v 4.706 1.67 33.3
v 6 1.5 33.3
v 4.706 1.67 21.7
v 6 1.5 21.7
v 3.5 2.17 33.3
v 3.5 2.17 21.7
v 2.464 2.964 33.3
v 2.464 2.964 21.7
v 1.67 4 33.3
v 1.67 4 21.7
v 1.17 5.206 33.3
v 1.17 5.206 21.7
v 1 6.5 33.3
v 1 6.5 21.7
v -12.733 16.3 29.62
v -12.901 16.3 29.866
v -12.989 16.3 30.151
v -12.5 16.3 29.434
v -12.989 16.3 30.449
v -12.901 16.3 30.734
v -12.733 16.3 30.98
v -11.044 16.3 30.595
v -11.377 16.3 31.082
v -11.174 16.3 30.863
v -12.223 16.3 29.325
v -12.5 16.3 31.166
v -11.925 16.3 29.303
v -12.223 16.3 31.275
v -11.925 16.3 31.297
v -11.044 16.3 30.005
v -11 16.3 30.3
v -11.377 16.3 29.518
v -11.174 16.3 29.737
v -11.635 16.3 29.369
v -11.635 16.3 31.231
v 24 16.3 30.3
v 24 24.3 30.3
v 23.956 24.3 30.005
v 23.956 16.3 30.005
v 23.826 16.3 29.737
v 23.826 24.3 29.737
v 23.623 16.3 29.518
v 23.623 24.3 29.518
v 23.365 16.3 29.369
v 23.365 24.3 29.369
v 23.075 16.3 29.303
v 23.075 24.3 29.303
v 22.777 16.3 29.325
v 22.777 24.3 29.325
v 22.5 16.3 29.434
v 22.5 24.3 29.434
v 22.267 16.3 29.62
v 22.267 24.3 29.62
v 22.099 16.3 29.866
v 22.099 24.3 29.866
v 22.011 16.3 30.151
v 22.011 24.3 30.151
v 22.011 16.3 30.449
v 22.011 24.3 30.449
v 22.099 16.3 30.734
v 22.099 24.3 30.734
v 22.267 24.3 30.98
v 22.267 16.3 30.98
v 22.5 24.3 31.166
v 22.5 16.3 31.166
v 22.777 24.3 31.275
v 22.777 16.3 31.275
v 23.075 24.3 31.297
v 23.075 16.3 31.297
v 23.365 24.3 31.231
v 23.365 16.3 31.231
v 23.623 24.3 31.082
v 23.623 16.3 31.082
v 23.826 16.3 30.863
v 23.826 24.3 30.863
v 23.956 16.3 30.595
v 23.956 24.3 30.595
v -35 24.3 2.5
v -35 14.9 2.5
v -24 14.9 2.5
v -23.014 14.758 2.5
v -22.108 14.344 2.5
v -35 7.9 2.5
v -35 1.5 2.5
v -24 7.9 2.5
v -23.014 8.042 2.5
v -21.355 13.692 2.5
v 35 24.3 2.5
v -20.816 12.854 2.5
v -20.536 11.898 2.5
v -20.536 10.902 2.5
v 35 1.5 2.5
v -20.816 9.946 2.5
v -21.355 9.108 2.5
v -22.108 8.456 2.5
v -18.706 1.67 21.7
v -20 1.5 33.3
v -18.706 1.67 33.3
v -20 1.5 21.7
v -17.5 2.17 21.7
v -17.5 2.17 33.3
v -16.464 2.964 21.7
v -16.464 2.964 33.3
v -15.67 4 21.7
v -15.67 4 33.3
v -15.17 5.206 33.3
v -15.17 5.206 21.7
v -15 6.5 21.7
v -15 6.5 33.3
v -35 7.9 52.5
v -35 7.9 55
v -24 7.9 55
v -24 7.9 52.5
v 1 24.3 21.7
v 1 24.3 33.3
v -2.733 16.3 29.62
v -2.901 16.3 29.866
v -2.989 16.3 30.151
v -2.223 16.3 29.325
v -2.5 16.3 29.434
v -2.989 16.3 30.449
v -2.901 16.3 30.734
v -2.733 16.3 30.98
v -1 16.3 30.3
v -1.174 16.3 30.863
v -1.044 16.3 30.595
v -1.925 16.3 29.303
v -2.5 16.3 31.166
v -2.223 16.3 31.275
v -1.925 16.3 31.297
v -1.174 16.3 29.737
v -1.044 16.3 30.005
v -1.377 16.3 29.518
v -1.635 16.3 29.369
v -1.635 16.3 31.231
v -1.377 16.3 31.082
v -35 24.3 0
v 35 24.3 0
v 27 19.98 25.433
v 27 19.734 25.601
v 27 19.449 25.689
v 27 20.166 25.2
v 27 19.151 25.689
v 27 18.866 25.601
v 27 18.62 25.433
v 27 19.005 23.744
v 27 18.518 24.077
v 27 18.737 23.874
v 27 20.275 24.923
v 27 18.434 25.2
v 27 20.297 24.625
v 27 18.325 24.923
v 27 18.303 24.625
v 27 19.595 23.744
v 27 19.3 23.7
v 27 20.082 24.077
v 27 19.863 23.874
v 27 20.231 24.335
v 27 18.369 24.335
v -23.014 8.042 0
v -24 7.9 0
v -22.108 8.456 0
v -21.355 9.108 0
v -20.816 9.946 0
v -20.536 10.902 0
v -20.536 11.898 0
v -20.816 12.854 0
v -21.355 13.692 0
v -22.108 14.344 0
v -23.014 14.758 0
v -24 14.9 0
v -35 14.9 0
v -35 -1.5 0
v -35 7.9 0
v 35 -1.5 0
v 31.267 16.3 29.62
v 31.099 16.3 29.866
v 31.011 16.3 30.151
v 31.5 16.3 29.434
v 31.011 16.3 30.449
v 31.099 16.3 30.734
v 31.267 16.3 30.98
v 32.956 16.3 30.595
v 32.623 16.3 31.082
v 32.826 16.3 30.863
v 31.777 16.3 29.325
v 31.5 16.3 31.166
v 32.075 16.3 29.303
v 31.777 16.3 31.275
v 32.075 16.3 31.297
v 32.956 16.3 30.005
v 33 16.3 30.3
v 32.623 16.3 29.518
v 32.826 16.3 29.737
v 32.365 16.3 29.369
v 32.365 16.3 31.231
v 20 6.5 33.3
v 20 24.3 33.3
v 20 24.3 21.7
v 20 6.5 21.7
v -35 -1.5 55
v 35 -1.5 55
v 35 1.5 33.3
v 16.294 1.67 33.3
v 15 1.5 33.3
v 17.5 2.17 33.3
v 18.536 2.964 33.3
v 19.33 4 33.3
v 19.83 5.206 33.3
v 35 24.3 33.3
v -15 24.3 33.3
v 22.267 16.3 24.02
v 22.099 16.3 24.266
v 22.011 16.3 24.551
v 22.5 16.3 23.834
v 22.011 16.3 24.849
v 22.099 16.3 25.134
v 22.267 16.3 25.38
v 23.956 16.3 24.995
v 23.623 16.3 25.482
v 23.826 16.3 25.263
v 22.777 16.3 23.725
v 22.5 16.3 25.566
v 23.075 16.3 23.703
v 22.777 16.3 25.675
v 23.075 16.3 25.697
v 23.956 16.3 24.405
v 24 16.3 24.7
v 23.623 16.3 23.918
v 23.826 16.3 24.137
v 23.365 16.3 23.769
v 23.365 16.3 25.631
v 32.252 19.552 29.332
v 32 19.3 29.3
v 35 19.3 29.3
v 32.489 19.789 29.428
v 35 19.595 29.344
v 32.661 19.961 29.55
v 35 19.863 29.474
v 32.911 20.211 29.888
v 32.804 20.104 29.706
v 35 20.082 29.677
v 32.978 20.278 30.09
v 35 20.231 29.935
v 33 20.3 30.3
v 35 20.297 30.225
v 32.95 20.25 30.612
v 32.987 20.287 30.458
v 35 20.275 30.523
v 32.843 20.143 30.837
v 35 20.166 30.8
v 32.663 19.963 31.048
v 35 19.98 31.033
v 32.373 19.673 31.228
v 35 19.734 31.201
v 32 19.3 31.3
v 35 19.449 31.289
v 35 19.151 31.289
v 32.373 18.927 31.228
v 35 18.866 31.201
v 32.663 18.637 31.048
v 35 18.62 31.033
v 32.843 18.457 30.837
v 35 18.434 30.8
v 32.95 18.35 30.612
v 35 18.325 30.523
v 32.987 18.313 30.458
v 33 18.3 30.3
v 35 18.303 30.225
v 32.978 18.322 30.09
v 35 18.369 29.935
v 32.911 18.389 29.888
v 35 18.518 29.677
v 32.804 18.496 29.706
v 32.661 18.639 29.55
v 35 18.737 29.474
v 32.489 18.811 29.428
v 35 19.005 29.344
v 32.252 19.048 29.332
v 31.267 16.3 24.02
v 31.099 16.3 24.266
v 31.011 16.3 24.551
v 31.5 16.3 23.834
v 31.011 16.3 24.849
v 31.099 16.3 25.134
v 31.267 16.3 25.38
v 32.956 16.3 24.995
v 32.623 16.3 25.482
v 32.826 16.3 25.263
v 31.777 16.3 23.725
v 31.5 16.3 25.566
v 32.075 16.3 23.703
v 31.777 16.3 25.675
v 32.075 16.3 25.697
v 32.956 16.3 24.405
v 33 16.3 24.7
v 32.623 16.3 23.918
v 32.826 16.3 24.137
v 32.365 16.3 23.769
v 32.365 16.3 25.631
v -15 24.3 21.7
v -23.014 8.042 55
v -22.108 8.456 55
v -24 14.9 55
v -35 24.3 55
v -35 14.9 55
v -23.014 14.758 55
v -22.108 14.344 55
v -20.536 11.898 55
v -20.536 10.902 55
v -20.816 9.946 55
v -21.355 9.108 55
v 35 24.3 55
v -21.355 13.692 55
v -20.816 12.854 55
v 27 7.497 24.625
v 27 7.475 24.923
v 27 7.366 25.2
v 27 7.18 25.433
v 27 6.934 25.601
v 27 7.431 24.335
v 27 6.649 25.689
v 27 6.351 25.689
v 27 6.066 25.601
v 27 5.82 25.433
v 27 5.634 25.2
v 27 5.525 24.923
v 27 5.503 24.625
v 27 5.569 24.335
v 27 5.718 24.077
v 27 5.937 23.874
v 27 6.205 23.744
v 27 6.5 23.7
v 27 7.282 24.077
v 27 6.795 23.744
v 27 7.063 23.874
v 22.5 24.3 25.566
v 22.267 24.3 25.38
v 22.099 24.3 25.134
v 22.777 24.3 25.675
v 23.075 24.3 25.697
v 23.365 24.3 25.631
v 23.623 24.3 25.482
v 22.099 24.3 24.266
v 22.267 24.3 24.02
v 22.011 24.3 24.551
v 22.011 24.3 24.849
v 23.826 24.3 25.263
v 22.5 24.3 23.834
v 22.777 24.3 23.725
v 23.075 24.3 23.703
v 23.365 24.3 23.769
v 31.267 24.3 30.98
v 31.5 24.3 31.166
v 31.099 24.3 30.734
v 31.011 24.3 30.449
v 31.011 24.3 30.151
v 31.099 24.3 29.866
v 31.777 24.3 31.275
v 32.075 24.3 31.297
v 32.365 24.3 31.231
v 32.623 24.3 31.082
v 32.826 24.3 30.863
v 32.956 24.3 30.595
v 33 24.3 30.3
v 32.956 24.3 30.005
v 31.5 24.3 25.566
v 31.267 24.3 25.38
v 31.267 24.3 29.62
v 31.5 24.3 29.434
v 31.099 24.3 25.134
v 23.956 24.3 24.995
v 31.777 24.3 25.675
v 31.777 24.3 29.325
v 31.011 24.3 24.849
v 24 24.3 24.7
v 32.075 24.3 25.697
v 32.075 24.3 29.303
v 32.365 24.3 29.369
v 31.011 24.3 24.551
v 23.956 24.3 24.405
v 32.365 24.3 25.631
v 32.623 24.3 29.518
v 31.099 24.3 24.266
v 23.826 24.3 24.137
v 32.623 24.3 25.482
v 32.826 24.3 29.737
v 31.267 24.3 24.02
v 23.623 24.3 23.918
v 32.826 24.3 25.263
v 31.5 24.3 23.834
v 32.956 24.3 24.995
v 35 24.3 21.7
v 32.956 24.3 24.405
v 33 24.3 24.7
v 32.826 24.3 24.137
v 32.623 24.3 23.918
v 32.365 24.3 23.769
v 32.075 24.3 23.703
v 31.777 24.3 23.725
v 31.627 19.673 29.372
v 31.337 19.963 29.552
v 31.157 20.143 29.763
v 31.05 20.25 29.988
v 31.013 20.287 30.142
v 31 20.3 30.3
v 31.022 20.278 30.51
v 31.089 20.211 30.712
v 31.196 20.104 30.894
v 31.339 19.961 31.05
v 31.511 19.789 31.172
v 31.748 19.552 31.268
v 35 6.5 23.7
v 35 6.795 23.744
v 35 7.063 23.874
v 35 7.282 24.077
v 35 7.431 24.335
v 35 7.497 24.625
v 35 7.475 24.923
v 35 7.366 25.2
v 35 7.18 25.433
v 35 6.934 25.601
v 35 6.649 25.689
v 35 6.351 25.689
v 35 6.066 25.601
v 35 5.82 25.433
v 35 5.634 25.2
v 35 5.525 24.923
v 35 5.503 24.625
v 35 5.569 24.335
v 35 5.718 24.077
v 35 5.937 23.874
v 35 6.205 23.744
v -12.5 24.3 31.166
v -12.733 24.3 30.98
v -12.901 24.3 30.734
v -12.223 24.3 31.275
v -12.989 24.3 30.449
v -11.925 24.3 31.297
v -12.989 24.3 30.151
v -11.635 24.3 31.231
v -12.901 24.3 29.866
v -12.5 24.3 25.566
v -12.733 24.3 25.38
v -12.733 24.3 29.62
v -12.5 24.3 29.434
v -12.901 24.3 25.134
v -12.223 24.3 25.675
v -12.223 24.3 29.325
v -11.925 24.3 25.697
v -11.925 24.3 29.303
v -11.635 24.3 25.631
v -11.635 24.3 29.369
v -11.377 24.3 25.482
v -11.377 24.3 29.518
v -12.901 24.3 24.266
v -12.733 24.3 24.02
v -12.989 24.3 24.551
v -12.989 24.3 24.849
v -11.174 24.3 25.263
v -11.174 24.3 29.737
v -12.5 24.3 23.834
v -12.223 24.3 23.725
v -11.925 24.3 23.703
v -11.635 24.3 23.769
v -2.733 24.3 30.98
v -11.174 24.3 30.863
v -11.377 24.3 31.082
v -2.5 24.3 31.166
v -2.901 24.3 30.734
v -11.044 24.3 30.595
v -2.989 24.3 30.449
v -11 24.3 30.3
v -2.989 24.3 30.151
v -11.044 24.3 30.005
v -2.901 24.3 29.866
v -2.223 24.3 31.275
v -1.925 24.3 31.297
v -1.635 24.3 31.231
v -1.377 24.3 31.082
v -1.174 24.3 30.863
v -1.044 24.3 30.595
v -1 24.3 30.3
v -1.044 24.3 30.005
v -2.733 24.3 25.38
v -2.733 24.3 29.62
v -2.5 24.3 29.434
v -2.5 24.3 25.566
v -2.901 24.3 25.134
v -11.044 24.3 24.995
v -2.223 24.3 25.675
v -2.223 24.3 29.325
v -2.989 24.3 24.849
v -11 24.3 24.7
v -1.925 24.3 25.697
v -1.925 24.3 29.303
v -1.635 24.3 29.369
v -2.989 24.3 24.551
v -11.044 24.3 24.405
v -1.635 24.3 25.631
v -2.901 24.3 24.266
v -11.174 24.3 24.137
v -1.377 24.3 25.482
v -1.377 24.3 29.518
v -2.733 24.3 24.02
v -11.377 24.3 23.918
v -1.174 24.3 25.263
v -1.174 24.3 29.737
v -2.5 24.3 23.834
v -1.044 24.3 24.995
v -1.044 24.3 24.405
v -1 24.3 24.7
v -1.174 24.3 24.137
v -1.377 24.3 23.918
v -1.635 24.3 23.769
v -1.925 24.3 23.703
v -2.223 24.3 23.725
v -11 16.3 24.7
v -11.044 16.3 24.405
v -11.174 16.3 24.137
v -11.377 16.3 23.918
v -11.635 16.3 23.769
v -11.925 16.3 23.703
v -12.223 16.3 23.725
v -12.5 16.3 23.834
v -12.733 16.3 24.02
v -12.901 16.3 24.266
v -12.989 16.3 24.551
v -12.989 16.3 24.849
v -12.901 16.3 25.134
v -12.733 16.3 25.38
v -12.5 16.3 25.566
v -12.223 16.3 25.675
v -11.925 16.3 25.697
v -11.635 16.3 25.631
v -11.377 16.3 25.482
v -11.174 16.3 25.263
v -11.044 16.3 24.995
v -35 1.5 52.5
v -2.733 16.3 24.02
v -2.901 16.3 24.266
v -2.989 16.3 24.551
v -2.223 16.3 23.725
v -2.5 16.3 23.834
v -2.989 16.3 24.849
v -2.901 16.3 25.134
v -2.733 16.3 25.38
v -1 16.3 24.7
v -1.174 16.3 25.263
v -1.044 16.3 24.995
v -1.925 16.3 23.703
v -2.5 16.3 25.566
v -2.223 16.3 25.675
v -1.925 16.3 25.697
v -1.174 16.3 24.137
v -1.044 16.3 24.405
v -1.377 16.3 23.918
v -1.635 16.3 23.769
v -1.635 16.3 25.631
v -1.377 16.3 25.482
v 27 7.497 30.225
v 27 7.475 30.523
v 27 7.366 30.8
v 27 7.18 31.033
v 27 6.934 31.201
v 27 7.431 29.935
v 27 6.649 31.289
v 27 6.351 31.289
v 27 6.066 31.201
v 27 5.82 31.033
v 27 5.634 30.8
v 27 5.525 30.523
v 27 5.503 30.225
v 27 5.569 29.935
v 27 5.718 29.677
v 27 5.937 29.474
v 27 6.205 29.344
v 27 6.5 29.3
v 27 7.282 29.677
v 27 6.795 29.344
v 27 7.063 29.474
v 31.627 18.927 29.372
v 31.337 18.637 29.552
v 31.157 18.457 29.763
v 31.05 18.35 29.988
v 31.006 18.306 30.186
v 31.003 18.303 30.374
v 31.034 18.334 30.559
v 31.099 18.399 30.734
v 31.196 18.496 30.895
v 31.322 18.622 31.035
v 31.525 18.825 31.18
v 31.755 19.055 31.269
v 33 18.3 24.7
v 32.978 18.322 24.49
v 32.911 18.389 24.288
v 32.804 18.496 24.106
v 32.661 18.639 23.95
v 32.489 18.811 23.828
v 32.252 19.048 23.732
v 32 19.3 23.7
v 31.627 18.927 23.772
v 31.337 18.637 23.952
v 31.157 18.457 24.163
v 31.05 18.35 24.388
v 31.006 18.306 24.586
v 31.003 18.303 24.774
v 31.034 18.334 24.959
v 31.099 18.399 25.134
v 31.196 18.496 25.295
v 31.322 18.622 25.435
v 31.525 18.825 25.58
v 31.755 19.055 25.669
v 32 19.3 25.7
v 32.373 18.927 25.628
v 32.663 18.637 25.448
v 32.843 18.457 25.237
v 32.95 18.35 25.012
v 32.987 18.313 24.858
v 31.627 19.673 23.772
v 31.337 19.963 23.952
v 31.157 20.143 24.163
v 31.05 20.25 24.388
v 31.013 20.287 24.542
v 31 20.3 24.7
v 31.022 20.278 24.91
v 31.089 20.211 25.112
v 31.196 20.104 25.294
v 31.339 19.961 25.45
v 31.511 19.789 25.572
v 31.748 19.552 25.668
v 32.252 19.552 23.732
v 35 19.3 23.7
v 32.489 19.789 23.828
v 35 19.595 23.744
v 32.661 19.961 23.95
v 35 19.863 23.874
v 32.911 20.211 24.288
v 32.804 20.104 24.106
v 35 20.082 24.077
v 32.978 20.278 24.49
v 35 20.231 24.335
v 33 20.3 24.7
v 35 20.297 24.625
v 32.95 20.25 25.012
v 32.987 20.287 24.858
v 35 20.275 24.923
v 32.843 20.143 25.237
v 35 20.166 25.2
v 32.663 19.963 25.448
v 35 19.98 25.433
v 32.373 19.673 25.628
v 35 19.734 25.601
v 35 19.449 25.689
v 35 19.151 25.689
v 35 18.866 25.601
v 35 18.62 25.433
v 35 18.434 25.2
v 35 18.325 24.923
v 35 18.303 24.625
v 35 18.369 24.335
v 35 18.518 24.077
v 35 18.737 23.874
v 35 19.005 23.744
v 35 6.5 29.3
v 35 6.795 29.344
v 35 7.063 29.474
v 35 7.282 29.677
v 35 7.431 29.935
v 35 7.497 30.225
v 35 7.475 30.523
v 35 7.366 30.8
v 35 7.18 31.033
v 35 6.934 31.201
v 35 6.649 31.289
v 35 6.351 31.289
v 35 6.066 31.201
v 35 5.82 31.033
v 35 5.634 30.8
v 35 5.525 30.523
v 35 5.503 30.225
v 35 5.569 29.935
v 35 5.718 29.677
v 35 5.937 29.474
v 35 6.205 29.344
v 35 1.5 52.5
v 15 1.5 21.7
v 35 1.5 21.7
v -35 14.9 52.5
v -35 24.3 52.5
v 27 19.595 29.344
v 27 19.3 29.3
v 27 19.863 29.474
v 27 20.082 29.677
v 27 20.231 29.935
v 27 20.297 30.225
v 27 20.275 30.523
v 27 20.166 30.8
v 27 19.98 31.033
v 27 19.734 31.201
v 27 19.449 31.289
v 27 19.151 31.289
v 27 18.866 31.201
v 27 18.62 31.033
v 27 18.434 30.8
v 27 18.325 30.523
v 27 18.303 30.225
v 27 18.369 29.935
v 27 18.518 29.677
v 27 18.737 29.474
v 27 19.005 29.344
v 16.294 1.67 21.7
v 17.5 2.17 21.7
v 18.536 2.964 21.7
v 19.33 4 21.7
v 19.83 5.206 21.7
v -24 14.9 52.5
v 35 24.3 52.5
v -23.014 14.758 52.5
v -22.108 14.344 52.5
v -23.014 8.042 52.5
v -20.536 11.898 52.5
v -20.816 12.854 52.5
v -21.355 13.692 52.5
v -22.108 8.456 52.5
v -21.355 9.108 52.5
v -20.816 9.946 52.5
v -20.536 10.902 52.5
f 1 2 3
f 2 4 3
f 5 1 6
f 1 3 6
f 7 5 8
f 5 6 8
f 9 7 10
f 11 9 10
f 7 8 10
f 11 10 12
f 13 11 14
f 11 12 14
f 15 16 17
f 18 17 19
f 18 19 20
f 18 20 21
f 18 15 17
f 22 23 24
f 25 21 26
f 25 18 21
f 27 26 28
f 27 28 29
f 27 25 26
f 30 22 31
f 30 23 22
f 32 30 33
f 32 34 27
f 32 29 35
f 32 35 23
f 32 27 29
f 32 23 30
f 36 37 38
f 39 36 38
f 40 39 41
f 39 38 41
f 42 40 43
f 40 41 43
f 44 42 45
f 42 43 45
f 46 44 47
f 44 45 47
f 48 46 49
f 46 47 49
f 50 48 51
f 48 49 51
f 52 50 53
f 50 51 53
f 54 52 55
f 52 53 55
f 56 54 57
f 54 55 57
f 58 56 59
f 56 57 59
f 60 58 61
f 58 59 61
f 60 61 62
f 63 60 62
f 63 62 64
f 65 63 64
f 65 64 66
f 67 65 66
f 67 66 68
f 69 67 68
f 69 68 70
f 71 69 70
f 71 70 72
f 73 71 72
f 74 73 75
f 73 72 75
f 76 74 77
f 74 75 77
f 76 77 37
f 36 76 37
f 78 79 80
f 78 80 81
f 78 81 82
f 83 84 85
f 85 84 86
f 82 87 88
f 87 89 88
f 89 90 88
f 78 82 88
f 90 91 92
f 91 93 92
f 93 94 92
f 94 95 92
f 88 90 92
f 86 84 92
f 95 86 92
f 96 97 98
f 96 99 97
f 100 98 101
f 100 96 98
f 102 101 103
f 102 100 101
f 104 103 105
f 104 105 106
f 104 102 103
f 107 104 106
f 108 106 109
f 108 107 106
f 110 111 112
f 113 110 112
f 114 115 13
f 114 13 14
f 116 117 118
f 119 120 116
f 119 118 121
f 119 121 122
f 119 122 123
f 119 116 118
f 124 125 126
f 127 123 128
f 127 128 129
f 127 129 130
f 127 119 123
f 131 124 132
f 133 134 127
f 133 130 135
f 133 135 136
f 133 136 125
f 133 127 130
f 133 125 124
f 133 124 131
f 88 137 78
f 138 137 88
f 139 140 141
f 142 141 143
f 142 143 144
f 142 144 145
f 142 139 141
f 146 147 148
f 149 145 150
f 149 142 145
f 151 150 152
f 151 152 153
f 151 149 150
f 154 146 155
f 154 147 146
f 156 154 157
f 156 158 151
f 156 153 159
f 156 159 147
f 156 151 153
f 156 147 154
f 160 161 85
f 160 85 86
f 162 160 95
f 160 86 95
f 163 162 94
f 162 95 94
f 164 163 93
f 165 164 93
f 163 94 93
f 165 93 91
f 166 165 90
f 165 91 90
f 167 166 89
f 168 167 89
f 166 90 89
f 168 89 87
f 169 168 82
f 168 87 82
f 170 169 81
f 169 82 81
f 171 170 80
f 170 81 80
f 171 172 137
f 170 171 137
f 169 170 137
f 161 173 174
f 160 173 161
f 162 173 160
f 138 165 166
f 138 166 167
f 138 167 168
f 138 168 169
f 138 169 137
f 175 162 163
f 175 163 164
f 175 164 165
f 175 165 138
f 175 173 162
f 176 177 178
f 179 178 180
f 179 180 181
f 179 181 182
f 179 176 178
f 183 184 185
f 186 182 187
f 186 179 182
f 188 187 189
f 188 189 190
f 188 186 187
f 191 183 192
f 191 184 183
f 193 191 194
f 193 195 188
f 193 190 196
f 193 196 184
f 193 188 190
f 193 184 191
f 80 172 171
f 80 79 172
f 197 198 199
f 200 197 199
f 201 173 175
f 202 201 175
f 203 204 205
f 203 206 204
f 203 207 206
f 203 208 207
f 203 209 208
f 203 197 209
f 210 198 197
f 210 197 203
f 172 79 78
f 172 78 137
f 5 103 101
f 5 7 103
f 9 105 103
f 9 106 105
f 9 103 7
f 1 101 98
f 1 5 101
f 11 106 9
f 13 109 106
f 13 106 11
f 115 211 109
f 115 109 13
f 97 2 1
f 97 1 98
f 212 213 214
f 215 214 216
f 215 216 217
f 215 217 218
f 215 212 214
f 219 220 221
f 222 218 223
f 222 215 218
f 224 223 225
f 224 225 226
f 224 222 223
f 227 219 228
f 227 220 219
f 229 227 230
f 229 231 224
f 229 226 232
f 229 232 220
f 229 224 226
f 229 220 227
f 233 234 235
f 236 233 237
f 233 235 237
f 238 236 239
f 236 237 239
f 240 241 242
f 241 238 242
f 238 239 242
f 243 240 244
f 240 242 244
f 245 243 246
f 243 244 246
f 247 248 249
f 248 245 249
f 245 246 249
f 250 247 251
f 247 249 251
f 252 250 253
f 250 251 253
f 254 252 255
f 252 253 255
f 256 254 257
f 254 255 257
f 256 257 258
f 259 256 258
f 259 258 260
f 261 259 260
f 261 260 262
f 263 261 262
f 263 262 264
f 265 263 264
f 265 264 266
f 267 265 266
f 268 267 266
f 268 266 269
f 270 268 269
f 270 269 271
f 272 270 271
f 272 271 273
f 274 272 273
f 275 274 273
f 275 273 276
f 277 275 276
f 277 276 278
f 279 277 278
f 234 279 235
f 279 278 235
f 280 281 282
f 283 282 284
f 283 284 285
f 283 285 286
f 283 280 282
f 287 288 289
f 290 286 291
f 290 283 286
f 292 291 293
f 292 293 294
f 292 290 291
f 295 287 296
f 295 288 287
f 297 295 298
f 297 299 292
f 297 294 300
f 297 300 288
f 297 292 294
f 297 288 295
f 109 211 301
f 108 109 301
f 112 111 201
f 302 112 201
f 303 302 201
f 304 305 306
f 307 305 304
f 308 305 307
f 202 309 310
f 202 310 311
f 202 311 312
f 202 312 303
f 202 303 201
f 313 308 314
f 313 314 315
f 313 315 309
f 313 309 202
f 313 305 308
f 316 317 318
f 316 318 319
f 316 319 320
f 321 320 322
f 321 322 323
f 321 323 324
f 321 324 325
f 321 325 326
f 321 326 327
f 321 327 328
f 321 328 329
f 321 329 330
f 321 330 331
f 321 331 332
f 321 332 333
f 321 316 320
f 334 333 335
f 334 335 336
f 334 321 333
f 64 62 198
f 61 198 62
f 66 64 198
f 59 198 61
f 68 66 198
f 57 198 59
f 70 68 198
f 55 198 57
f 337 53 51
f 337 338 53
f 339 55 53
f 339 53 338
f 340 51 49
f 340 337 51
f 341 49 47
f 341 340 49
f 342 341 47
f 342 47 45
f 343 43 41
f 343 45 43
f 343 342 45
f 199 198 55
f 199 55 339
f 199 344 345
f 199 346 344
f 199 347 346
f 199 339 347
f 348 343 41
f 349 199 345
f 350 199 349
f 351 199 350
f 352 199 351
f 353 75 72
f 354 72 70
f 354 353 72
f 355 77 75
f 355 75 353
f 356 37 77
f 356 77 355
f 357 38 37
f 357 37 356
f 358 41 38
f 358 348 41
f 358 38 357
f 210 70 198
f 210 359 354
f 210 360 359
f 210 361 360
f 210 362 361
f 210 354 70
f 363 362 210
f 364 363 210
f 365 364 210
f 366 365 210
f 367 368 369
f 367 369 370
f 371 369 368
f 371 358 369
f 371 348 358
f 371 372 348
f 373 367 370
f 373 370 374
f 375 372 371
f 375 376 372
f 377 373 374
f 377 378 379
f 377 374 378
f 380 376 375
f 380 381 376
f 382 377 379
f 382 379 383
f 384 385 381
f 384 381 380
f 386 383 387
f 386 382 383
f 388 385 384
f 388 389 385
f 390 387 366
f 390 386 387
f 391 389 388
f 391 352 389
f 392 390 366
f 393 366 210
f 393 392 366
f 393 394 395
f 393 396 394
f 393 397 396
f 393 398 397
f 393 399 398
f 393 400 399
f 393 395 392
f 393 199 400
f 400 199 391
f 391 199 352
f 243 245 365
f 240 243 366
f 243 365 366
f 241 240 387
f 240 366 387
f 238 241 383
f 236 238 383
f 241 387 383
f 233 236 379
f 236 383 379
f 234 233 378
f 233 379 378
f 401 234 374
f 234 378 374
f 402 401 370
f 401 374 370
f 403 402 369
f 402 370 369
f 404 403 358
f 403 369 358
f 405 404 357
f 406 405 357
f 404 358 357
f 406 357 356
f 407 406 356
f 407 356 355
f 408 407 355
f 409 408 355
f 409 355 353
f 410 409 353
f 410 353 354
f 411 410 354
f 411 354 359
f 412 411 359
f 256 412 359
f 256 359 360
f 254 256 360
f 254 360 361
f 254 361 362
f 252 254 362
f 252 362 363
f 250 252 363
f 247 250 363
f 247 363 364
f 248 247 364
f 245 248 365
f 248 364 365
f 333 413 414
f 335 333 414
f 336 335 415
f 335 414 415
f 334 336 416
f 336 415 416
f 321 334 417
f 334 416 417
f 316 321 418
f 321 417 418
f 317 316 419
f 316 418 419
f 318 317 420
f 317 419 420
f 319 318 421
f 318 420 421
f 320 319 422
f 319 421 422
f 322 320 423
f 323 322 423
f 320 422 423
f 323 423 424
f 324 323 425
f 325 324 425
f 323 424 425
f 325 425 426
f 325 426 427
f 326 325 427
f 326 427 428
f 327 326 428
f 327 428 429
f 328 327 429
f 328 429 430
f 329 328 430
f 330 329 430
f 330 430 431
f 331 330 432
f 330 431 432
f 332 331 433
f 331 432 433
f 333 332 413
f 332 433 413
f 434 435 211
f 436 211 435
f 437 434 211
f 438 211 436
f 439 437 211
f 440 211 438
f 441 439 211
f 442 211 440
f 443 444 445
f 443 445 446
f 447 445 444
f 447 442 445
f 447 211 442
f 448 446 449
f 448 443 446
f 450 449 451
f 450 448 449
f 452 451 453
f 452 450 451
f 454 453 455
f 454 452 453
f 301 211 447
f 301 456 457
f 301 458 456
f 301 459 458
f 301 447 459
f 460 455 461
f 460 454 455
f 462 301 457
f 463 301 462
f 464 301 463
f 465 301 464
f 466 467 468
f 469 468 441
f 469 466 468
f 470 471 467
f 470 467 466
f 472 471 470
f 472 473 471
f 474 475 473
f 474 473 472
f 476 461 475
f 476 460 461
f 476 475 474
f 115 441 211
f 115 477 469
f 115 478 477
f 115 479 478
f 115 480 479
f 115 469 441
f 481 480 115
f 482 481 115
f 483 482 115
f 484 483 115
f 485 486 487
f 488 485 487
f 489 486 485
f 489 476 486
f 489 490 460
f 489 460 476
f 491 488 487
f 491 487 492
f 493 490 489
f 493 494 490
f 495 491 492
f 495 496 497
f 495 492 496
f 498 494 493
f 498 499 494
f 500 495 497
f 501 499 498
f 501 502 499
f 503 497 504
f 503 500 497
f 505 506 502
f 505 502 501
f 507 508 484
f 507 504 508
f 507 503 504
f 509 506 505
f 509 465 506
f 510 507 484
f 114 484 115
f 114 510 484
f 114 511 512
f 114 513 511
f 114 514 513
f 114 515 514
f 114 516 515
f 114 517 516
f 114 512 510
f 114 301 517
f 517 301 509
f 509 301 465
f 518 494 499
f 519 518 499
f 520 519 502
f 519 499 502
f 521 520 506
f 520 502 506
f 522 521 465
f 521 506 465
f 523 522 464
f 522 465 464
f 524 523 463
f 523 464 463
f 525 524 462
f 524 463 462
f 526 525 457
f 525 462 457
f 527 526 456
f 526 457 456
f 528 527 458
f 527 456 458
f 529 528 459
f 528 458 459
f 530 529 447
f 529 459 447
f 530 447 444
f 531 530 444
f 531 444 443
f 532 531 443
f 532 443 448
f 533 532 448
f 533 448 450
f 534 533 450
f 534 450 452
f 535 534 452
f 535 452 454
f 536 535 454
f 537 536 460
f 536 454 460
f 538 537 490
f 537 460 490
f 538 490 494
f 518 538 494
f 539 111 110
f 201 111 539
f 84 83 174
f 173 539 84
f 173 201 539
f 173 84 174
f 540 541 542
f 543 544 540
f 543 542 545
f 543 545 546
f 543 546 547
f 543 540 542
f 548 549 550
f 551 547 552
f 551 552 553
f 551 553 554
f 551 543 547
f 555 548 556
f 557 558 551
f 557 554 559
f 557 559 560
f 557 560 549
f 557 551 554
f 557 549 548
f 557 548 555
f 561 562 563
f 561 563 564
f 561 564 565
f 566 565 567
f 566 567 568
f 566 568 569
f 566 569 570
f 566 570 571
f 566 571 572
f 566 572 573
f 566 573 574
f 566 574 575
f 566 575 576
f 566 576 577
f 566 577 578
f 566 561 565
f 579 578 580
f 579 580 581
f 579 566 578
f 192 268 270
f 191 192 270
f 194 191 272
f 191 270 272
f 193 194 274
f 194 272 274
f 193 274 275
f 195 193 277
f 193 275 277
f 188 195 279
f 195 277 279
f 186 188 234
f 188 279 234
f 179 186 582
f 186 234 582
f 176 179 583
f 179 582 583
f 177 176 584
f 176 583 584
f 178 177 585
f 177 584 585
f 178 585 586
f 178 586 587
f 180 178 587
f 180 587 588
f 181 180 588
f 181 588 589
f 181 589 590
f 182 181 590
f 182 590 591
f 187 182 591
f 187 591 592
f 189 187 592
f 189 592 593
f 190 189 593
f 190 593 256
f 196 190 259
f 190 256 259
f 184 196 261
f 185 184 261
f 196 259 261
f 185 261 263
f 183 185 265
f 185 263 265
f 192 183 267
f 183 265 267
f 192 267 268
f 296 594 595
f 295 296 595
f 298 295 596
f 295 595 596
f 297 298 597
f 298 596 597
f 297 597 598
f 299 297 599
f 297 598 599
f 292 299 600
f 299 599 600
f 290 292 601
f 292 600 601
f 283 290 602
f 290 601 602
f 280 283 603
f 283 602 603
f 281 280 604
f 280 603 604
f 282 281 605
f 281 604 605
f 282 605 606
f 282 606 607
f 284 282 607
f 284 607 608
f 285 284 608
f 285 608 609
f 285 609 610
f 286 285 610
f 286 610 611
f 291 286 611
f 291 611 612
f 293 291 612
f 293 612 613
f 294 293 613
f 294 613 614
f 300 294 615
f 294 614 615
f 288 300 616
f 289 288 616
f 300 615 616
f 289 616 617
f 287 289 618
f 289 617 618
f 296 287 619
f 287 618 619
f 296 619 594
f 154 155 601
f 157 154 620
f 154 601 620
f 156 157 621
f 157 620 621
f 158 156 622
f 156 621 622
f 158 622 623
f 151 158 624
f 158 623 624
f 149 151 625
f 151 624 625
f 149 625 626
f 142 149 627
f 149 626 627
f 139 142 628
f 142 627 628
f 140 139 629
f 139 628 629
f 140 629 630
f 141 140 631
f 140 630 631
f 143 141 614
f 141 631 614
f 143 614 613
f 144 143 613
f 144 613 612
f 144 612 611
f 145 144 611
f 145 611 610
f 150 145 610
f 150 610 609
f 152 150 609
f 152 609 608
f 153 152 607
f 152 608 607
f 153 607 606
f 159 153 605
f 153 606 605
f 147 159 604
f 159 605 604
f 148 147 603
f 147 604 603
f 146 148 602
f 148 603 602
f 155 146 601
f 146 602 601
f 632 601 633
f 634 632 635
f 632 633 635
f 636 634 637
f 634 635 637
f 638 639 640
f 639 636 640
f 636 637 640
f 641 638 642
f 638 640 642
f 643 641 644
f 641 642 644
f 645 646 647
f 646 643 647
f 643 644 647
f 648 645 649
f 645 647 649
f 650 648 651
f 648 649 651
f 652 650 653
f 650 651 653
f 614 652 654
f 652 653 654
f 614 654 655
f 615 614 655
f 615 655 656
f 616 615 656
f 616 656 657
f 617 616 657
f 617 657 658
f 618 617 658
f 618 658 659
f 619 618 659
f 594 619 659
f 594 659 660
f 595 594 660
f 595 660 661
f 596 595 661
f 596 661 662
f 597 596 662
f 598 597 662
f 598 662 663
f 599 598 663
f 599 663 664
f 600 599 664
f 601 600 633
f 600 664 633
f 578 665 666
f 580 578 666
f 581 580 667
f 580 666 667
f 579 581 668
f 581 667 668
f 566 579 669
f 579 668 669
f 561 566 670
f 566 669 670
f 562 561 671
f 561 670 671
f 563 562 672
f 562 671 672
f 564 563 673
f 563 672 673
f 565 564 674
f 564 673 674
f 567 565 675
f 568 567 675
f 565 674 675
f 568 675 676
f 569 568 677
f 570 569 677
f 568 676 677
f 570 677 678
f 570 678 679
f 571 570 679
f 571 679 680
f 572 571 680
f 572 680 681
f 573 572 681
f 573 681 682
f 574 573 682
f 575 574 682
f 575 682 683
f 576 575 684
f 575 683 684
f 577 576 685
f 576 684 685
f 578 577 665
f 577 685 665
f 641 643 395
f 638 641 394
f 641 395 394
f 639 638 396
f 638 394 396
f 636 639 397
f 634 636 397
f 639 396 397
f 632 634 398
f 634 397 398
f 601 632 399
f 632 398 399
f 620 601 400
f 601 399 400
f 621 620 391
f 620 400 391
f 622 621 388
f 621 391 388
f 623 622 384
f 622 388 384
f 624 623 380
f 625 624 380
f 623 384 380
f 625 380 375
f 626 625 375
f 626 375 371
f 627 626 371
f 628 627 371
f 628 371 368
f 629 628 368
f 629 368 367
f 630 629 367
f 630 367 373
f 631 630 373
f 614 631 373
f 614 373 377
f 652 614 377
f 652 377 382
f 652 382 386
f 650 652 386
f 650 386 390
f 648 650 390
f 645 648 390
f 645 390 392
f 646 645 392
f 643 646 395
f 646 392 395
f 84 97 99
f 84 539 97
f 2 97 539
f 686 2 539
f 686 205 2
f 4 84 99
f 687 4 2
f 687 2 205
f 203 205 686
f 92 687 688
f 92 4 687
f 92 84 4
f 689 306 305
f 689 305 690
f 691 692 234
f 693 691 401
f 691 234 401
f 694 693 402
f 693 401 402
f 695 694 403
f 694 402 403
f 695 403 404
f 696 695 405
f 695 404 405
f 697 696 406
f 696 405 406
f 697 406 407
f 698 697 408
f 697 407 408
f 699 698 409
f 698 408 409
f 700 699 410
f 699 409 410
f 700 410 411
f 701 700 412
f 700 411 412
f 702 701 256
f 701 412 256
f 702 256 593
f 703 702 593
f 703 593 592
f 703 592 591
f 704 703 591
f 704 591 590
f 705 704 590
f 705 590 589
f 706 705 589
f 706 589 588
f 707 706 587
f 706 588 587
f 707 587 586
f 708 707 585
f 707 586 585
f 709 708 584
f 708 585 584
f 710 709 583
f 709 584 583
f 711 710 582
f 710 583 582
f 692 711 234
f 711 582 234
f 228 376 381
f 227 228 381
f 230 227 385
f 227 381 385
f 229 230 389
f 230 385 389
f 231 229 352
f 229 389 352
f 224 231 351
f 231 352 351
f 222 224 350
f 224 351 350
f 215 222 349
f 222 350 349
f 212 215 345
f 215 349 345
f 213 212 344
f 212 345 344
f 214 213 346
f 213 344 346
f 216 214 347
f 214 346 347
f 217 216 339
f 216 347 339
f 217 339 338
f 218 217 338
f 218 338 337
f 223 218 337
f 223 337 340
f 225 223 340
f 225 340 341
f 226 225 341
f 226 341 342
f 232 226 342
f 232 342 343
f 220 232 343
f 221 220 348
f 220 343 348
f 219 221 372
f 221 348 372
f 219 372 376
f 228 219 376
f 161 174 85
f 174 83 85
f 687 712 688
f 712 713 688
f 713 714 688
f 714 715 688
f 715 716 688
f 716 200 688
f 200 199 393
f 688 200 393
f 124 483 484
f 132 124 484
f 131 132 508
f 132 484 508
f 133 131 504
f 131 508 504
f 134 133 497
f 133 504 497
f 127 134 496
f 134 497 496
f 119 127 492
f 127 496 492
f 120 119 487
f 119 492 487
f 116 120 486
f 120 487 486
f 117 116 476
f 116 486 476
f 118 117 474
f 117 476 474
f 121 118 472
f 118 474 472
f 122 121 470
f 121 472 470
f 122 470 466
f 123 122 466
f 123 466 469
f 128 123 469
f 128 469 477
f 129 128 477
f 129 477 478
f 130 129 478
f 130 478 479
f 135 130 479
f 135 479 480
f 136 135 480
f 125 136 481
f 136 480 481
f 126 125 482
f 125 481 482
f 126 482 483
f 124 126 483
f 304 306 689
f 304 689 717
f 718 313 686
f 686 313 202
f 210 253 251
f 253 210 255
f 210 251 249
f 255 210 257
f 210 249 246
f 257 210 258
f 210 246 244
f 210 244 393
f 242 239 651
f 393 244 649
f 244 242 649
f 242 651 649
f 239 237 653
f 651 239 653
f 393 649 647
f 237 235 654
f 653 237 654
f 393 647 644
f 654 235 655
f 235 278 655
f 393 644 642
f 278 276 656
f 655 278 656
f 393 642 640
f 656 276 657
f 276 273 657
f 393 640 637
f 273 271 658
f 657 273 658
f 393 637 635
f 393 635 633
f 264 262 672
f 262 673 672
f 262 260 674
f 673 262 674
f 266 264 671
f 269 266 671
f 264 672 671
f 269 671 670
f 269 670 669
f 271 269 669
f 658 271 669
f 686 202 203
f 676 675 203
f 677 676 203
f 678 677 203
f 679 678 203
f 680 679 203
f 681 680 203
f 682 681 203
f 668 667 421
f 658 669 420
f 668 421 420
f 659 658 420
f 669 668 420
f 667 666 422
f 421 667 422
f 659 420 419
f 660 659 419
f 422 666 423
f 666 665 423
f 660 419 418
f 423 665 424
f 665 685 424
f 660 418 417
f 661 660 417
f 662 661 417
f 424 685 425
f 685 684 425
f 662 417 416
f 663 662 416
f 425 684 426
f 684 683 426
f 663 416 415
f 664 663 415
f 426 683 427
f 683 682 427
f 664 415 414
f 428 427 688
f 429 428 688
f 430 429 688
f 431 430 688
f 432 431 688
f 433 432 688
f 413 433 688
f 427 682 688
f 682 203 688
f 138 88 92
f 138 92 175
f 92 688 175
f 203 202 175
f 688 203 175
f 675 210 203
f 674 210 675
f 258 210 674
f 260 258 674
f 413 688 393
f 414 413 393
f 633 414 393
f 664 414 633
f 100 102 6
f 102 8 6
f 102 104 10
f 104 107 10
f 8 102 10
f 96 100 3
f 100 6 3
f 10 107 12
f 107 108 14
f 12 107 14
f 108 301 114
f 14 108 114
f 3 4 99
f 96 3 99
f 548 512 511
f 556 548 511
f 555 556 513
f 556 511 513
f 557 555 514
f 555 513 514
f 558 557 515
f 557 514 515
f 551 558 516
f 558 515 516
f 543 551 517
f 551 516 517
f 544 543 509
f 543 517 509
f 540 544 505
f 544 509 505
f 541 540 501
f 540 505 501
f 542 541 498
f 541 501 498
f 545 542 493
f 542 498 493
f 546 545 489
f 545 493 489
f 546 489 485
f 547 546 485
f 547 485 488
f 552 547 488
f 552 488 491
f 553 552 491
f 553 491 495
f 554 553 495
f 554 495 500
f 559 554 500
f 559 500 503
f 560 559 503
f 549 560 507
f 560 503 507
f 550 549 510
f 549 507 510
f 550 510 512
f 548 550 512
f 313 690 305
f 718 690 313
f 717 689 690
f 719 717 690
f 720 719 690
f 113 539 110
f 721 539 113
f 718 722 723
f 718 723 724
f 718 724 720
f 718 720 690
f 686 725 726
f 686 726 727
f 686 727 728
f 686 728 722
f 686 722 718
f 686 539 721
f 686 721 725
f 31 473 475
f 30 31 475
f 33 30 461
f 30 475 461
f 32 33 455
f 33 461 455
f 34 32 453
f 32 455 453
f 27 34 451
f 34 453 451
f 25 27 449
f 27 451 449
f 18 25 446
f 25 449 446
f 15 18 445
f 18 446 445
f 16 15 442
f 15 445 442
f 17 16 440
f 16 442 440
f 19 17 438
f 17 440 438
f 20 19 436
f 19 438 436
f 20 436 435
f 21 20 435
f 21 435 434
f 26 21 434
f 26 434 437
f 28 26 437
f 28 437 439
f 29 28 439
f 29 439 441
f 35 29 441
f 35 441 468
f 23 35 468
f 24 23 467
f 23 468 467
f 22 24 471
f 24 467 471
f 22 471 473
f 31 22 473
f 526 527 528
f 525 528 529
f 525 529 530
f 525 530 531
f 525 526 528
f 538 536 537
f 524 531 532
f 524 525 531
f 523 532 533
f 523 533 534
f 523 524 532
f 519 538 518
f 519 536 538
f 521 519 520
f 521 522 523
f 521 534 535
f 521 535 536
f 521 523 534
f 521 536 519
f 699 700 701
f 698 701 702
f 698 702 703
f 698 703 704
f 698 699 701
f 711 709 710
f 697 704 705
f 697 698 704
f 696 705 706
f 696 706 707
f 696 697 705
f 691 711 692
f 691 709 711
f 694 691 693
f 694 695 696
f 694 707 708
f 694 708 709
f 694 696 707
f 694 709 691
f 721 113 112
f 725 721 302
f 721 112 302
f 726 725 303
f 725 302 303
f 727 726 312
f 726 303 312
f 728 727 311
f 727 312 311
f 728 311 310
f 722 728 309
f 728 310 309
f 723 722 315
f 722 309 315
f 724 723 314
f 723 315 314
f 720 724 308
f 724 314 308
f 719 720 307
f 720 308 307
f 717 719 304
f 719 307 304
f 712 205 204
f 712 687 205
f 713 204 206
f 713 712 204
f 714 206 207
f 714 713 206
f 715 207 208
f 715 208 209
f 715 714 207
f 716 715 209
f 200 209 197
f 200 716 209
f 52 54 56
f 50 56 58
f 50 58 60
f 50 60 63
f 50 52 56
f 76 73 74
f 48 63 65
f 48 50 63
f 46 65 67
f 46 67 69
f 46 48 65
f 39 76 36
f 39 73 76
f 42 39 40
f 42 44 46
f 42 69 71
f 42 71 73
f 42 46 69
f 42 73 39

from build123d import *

# Parameters (mm, degrees)
SKETCH1_W           = 70
SKETCH1_H           = 3
BOSS_EXTRUDE1_DEPTH = 55
SKETCH2_W           = 70
SKETCH2_H           = 2.5
BOSS_EXTRUDE2_DEPTH = 22.8
SKETCH5_R           = 3.5
CUT_EXTRUDE1_DEPTH  = 84.8
SKETCH6_W           = 16
SKETCH6_H           = 11.6
SKETCH6_W_2         = 15
BOSS_EXTRUDE7_DEPTH = 22.8
SKETCH7_R           = 1
CUT_EXTRUDE2_DEPTH  = 8
SKETCH8_R           = 1
CUT_EXTRUDE3_DEPTH  = 8
FILLET1_R           = 5
SKETCH9_W           = 14.084433838
SKETCH9_H           = 7
CUT_EXTRUDE4_DEPTH  = 66


with BuildPart() as part:
    # Sketch1 → Boss-Extrude1 (new body)
    with BuildSketch(Plane.XY):
        Rectangle(SKETCH1_W, SKETCH1_H)
    extrude(amount=BOSS_EXTRUDE1_DEPTH)

    # Sketch2 → Boss-Extrude2 (add)
    with BuildSketch(Plane(origin=(0, 1.5, 0), x_dir=(1, 0, 0), z_dir=(0, 1, 0))):
        with Locations((0, -1.25)):
            Rectangle(SKETCH2_W, SKETCH2_H)
        with Locations((0, -53.75)):
            Rectangle(SKETCH2_W, SKETCH2_H)
    extrude(amount=BOSS_EXTRUDE2_DEPTH)

    # Sketch5 → Cut-Extrude1 (cut)
    with BuildSketch(Plane.XY.offset(55)):
        with Locations((-24, 11.4)):
            Circle(SKETCH5_R)
    extrude(amount=-CUT_EXTRUDE1_DEPTH, mode=Mode.SUBTRACT)

    # Sketch6 → Boss-Extrude7 (add)
    with BuildSketch(Plane(origin=(0, 24.3, 0), x_dir=(1, 0, 0), z_dir=(0, 1, 0))):
        with Locations((-7, -27.5)):
            Rectangle(SKETCH6_W, SKETCH6_H)
        with Locations((27.5, -27.5)):
            Rectangle(SKETCH6_W_2, SKETCH6_H)
    extrude(amount=-BOSS_EXTRUDE7_DEPTH)

    # Sketch7 → Cut-Extrude2 (cut)
    with BuildSketch(Plane(origin=(0, 24.3, 0), x_dir=(1, 0, 0), z_dir=(0, 1, 0))):
        with Locations((-12, -24.7)):
            Circle(SKETCH7_R)
        with Locations((23, -30.3)):
            Circle(SKETCH7_R)
        with Locations((-2, -24.7)):
            Circle(SKETCH7_R)
        with Locations((-2, -30.3)):
            Circle(SKETCH7_R)
        with Locations((-12, -30.3)):
            Circle(SKETCH7_R)
        with Locations((23, -24.7)):
            Circle(SKETCH7_R)
        with Locations((32, -24.7)):
            Circle(SKETCH7_R)
        with Locations((32, -30.3)):
            Circle(SKETCH7_R)
    extrude(amount=-CUT_EXTRUDE2_DEPTH, mode=Mode.SUBTRACT)

    # Sketch8 → Cut-Extrude3 (cut)
    with BuildSketch(Plane(origin=(35, 0, 0), x_dir=(0, 0, -1), z_dir=(1, 0, 0))):
        with Locations((-24.7, 19.3)):
            Circle(SKETCH8_R)
        with Locations((-30.3, 19.3)):
            Circle(SKETCH8_R)
        with Locations((-24.7, 6.5)):
            Circle(SKETCH8_R)
        with Locations((-30.3, 6.5)):
            Circle(SKETCH8_R)
    extrude(amount=-CUT_EXTRUDE3_DEPTH, mode=Mode.SUBTRACT)

    # Fillet1
    fillet1_edges = [part.edges().sort_by_distance(p)[0] for p in [
        (1, 1.5, 27.5),
        (-15, 1.5, 27.5),
        (20, 1.5, 27.5),
    ]]
    fillet(fillet1_edges, radius=FILLET1_R)

    # Sketch9 → Cut-Extrude4 (cut)
    with BuildSketch(Plane.XY.offset(55)):
        with Locations((-31.042216919, 11.4)):
            Rectangle(SKETCH9_W, SKETCH9_H)
    extrude(amount=-CUT_EXTRUDE4_DEPTH, mode=Mode.SUBTRACT)


solid = part.part
